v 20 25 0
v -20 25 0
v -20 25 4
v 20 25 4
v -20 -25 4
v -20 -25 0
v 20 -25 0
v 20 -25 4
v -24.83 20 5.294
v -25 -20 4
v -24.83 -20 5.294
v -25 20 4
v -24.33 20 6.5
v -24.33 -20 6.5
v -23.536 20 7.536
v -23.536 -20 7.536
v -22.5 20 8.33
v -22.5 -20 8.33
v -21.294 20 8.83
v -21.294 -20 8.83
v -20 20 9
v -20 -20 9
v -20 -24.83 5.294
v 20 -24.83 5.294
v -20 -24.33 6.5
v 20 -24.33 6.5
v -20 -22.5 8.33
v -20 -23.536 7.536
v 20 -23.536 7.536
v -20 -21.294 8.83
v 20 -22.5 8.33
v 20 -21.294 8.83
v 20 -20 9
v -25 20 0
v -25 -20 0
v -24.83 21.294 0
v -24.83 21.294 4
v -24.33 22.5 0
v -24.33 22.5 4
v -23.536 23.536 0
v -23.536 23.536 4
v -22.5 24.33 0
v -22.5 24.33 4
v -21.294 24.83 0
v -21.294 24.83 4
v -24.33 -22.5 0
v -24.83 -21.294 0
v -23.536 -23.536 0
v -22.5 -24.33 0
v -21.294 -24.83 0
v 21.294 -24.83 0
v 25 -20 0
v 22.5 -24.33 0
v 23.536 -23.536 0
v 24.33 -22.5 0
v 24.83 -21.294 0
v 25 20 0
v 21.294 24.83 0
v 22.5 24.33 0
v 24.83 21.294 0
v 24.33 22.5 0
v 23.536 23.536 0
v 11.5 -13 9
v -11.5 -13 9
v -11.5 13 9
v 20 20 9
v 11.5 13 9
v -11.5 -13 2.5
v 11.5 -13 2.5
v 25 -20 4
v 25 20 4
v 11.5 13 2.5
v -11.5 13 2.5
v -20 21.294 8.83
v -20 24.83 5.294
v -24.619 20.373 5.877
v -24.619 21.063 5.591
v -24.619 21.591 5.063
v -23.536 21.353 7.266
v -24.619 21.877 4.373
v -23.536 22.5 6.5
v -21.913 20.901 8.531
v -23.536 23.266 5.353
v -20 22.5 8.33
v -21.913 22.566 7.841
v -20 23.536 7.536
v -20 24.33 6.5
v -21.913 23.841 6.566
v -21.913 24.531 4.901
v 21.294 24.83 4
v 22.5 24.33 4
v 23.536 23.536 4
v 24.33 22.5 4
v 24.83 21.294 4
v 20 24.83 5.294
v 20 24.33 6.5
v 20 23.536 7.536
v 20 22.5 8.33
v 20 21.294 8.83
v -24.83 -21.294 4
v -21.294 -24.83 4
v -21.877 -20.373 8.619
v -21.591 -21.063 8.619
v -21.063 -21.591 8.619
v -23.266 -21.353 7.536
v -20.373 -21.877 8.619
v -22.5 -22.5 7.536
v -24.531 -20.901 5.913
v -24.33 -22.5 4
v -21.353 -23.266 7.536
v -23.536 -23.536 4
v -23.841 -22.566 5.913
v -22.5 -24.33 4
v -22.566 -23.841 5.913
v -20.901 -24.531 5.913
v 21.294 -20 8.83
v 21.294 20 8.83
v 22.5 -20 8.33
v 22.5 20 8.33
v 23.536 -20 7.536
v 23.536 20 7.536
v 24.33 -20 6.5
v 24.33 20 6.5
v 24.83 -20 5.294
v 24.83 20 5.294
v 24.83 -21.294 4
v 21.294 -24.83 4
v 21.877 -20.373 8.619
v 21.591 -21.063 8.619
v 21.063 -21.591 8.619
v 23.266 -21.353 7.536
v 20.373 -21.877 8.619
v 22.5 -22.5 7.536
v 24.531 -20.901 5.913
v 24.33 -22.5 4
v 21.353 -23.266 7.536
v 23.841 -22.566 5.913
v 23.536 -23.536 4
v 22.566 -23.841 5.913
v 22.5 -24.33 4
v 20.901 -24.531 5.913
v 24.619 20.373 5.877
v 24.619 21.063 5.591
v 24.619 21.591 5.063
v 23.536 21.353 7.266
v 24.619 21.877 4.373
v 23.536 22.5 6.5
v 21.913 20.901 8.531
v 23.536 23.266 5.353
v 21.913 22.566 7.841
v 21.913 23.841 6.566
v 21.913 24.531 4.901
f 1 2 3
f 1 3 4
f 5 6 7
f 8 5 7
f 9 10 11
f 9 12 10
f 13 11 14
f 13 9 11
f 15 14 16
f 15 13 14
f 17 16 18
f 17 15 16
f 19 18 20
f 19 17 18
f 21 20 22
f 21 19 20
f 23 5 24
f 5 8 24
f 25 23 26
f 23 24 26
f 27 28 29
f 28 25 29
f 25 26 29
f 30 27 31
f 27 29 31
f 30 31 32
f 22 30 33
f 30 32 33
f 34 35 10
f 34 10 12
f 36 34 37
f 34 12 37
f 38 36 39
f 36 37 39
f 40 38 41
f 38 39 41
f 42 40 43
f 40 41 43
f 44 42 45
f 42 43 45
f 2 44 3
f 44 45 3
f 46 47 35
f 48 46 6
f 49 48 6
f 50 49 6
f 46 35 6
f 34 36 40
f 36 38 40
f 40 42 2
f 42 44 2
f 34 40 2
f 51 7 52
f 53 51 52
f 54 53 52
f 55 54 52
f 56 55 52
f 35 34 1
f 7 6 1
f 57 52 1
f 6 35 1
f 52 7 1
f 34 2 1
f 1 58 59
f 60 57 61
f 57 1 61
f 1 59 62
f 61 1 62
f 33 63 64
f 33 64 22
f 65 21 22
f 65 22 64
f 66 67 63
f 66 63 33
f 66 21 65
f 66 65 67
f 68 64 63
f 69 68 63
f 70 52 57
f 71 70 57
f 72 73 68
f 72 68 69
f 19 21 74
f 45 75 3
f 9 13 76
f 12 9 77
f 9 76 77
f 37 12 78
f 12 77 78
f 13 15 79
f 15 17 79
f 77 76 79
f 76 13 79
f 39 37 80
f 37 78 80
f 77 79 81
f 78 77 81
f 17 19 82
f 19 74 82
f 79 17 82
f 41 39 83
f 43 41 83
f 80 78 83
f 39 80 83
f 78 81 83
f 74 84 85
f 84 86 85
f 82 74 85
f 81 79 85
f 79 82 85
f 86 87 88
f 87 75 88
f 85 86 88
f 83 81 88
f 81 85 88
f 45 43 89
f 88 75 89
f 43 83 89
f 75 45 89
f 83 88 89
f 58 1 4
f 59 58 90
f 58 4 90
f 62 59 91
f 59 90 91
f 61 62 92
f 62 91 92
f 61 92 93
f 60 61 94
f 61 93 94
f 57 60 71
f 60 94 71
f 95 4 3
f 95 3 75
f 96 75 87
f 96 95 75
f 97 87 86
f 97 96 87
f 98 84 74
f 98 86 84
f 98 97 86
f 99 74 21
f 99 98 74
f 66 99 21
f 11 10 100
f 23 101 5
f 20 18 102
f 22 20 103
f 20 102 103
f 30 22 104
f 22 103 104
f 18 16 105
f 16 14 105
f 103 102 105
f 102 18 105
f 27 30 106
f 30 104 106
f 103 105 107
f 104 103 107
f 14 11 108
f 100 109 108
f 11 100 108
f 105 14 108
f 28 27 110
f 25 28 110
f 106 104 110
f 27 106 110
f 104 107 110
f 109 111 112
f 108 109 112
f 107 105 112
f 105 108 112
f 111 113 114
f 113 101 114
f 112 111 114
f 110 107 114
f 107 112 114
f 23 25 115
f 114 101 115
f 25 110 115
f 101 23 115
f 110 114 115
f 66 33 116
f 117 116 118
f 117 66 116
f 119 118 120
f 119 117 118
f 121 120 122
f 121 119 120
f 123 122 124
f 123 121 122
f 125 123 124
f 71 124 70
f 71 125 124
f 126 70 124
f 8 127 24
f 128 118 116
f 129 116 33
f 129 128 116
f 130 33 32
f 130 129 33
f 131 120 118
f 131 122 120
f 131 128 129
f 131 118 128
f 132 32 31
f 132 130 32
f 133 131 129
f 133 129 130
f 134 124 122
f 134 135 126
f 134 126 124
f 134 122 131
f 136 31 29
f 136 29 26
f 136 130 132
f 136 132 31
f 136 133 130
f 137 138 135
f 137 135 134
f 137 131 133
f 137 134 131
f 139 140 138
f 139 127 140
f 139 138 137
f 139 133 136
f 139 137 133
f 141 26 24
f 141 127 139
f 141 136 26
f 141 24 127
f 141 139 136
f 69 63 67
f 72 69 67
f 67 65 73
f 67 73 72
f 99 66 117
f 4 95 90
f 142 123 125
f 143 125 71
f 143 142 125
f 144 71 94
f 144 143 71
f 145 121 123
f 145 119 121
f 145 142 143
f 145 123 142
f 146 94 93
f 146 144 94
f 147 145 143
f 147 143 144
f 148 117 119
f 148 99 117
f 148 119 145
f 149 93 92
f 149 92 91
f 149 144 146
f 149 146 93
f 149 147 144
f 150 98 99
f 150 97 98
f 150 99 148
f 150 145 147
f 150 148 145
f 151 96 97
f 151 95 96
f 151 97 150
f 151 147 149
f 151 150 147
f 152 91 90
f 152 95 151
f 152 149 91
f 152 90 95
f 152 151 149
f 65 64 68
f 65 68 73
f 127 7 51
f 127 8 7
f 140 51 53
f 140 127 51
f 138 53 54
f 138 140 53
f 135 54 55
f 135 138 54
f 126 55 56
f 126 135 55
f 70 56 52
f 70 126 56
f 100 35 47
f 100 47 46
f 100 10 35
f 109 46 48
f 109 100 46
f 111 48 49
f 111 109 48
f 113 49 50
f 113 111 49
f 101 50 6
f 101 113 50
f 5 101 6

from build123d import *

# Parameters (mm, degrees)
F0_W     = 50
F0_H     = 50
F1_DEPTH = 9
F2_W     = 23
F2_H     = 26
F3_DEPTH = 6.5
F4_R     = 5


with BuildPart() as f1:
    # F0 (on Top) → F1 (new body)
    with BuildSketch(Plane.XY):
        Rectangle(F0_W, F0_H)
    extrude(amount=F1_DEPTH)

    # F2 (on face) → F3 (cut)
    with BuildSketch(Plane.XY.offset(9)):
        Rectangle(F2_W, F2_H)
    extrude(amount=-F3_DEPTH, mode=Mode.SUBTRACT)

    # F4
    f4_edges = [f1.edges().sort_by_distance(p)[0] for p in [
        (-25, -25, 4.5),
        (25, -25, 4.5),
        (0, 25, 9),
        (-25, 0, 9),
        (25, 0, 9),
        (0, -25, 9),
        (-25, 25, 4.5),
        (25, 25, 4.5),
    ]]
    fillet(f4_edges, radius=F4_R)


solid = f1.part
